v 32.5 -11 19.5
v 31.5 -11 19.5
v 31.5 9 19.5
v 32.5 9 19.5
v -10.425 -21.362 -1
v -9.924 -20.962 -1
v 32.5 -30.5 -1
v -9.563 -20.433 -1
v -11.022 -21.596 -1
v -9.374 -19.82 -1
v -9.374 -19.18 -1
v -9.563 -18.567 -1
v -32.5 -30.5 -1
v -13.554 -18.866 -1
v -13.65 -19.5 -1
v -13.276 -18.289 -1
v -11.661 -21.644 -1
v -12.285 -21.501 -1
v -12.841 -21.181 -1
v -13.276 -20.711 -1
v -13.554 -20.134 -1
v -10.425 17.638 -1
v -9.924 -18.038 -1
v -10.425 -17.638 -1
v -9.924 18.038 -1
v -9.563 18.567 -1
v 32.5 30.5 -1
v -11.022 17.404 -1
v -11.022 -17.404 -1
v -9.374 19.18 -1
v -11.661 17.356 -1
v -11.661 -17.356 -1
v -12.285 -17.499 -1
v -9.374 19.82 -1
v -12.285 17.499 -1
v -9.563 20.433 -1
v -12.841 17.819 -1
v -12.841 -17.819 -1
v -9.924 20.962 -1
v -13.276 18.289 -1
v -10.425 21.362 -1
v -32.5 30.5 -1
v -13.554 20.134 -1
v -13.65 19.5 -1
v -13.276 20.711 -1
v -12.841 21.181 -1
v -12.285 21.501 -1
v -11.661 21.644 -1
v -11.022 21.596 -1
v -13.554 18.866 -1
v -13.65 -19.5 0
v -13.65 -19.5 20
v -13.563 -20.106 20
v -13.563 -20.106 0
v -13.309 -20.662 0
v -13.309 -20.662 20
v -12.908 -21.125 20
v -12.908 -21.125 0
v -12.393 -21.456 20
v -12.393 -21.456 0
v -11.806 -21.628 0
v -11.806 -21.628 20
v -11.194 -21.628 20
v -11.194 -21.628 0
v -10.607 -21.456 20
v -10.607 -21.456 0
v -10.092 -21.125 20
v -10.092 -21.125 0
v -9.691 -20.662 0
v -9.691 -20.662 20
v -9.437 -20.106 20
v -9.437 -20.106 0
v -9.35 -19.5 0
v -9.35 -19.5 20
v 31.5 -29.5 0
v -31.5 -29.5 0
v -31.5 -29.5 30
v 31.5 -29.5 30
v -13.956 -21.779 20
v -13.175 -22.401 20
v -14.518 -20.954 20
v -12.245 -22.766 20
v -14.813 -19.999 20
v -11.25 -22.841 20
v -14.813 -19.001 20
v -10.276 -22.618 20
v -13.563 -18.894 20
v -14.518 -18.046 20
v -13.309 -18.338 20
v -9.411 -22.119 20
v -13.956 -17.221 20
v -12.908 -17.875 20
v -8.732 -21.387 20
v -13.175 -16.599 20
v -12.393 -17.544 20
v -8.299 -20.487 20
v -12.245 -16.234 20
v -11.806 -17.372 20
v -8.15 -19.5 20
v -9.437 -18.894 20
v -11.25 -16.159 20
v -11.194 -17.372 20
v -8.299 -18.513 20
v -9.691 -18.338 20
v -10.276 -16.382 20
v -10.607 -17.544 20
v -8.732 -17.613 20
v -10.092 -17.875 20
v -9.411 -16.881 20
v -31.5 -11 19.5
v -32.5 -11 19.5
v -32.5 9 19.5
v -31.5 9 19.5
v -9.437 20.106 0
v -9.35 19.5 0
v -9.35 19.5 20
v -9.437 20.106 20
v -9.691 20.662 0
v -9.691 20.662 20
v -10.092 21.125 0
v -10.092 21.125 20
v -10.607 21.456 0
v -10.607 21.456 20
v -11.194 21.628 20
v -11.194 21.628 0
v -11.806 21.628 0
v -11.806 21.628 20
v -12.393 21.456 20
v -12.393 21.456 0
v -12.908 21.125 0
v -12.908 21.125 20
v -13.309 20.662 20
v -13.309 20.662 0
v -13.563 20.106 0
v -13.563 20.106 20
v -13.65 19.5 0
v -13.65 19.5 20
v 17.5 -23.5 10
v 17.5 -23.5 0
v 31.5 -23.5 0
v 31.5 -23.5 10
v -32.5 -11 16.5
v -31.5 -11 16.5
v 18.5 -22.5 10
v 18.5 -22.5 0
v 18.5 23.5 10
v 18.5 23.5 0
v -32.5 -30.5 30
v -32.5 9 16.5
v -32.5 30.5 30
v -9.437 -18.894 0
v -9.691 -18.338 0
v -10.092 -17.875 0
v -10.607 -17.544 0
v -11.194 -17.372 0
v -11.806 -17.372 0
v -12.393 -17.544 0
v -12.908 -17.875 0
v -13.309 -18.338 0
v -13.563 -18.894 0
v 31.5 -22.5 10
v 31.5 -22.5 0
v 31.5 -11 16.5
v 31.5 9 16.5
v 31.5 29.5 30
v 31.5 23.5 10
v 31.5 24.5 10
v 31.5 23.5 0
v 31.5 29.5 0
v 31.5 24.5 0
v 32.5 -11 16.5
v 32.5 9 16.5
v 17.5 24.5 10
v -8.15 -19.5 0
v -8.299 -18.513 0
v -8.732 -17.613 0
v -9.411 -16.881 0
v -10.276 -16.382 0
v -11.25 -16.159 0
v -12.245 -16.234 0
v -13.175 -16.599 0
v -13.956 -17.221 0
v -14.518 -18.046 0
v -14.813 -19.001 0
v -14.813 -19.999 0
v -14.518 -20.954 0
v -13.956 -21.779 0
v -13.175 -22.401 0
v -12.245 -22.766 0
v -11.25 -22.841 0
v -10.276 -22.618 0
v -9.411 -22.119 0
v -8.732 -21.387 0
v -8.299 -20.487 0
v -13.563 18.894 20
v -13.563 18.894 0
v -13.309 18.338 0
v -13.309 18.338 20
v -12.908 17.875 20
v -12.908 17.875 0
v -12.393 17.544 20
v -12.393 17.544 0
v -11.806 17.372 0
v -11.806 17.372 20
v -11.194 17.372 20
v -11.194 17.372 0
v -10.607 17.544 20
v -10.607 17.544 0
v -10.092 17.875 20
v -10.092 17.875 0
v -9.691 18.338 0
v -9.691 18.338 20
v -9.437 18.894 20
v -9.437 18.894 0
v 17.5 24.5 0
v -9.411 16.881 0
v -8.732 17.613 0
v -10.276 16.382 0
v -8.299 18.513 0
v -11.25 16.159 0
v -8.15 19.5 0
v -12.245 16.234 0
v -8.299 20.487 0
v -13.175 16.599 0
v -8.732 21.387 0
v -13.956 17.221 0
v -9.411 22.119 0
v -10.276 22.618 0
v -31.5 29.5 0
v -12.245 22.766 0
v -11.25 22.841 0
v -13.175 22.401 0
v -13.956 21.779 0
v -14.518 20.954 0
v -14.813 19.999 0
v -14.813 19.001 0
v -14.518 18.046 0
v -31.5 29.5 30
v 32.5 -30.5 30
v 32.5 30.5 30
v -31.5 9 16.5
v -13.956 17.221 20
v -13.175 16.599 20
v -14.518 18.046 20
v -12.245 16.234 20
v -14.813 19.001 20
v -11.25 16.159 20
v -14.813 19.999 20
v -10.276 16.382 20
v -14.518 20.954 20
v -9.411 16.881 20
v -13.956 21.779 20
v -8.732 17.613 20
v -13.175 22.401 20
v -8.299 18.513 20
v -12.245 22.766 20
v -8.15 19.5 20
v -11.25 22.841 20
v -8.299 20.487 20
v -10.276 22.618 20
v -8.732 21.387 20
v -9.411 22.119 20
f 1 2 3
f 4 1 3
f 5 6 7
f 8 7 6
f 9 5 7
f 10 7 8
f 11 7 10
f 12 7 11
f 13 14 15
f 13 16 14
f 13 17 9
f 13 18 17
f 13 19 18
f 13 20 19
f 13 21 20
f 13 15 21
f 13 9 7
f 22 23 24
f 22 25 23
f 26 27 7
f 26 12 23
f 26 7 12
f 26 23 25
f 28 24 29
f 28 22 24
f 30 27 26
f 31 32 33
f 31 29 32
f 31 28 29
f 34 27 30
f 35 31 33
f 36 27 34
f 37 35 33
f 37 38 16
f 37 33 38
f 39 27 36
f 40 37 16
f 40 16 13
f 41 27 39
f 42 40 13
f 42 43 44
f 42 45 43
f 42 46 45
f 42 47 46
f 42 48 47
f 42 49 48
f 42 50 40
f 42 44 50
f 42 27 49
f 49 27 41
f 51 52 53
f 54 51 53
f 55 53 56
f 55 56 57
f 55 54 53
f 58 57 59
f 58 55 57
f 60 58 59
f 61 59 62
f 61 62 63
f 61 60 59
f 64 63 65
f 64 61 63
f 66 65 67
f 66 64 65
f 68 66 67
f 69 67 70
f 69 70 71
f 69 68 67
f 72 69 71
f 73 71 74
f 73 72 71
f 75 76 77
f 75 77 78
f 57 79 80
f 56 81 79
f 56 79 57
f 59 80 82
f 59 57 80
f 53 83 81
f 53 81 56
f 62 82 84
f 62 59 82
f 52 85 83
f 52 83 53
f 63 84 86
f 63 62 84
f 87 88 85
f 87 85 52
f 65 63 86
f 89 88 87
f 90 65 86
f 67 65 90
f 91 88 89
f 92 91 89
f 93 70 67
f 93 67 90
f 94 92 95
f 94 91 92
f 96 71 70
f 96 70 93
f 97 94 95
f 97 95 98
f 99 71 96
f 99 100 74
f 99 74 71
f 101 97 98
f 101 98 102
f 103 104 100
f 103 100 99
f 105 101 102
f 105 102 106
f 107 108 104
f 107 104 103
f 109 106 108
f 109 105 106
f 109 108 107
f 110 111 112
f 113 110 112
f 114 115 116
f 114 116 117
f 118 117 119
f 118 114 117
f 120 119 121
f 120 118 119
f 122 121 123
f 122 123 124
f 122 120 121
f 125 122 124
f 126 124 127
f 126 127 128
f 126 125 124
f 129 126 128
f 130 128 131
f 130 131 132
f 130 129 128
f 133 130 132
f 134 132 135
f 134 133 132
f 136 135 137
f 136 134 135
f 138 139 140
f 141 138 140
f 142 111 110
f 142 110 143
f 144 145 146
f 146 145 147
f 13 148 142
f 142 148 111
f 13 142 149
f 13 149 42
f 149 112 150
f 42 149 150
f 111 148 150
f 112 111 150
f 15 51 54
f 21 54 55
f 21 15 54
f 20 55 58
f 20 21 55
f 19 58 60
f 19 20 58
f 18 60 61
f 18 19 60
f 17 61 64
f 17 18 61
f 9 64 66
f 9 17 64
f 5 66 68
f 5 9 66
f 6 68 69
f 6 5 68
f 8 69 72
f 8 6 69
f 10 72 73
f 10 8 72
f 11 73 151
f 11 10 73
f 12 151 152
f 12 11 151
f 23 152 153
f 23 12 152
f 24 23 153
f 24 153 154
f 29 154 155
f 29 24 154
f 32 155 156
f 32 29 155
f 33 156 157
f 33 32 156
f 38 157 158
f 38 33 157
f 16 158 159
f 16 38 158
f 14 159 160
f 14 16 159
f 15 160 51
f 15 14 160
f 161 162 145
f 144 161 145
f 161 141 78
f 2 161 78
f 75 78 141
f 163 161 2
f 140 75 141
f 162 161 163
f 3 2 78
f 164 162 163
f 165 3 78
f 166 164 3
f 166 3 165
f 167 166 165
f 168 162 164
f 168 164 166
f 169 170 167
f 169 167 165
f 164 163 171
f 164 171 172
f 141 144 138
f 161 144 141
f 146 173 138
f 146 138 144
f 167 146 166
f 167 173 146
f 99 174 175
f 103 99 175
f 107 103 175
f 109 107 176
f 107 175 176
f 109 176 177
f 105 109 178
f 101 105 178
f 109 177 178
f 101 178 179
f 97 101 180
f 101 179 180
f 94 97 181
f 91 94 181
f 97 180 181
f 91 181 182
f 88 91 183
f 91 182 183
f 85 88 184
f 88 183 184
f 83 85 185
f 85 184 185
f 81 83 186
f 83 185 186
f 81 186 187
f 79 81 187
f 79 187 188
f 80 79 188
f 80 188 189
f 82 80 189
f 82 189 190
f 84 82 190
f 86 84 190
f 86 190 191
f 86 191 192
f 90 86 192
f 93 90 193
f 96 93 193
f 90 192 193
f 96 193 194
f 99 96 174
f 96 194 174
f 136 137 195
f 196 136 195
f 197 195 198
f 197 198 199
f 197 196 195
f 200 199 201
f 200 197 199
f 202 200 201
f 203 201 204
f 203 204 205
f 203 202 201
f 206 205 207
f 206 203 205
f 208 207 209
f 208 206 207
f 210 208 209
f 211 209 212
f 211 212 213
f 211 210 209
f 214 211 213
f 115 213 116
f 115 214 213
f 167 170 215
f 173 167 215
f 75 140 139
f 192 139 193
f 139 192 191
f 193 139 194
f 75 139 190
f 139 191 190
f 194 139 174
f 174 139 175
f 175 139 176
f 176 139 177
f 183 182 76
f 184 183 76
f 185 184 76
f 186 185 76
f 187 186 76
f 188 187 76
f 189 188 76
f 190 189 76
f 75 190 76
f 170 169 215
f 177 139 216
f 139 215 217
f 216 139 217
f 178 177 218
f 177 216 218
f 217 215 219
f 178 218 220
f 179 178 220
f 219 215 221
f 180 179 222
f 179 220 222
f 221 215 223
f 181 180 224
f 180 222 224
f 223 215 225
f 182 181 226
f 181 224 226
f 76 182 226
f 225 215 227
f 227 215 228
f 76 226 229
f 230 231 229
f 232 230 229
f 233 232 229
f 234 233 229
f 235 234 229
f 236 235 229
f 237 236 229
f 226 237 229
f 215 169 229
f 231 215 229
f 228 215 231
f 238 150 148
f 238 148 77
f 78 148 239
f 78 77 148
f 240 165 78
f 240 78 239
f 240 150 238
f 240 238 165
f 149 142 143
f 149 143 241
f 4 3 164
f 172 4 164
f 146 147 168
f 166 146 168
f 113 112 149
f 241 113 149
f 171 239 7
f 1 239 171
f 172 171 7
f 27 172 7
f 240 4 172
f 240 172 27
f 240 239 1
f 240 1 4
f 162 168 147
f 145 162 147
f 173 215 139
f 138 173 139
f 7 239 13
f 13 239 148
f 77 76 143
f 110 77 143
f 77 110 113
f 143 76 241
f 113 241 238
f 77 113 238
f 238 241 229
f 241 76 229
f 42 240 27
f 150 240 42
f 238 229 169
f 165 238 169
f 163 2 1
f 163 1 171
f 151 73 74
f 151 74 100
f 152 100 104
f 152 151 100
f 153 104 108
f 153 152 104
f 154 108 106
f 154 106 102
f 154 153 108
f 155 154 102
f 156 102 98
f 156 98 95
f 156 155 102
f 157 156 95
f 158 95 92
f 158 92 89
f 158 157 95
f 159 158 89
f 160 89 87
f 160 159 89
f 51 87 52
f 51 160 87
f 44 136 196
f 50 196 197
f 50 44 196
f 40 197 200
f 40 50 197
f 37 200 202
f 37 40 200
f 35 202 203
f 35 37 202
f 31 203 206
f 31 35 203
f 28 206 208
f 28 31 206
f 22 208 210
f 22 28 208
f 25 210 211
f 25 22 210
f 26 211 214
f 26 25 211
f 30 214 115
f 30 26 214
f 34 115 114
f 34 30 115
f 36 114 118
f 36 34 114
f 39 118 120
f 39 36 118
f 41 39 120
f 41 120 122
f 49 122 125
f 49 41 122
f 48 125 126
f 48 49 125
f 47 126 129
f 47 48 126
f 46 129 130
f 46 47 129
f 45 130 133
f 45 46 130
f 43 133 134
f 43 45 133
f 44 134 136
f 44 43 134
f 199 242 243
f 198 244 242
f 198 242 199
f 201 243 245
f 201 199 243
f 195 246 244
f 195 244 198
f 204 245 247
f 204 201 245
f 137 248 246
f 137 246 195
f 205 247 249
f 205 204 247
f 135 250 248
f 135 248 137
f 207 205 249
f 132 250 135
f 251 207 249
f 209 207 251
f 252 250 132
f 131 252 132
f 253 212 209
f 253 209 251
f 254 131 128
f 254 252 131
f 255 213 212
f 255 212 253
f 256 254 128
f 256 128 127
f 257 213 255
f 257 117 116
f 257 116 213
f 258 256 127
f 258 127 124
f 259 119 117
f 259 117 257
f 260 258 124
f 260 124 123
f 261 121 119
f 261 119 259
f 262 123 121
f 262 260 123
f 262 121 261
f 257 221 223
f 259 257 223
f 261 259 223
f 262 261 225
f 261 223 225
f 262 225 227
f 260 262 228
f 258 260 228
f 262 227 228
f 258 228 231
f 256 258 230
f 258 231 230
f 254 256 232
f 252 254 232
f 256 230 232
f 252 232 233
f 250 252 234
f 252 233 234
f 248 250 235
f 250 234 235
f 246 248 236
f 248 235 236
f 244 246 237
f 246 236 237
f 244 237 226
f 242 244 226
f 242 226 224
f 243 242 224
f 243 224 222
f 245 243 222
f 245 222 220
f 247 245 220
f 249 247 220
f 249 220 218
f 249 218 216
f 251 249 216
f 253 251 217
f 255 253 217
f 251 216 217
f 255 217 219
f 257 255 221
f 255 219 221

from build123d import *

# Parameters (mm, degrees)
CROQUIS1_W                 = 65
CROQUIS1_H                 = 61
SALIENTE_EXTRUIR1_DEPTH    = 30
CROQUIS1_7_R               = 3.35
CROQUIS1_7_R_2             = 2.15
SALIENTE_EXTRUIR2_DEPTH    = 20
SALIENTE_EXTRUIR2_2_DEPTH  = 20
SALIENTE_EXTRUIR4_DEPTH    = 10
CROQUIS2_W                 = 65
CROQUIS2_H                 = 61
SALIENTE_EXTRUIR5_DEPTH    = 1
CORTAR_EXTRUIR1_DEPTH      = 54.726157503
CORTAR_EXTRUIR1_DEPTH_BACK = 54.726157503
CROQUIS3_W                 = 3
CROQUIS3_H                 = 20
CORTAR_EXTRUIR2_START      = -40
CROQUIS5_R                 = 2.15
CORTAR_EXTRUIR2_DEPTH      = 40


with BuildPart() as part:
    # Croquis1 → Saliente-Extruir1 (new body)
    with BuildSketch(Plane.XY):
        Rectangle(CROQUIS1_W, CROQUIS1_H)
        Polygon((31.5, -29.5), (-31.5, -29.5), (-31.5, 29.5), (31.5, 29.5), (31.5, 24.5), (31.5, 23.5), (31.5, -22.5), (31.5, -23.5), align=None, mode=Mode.SUBTRACT)
    extrude(amount=SALIENTE_EXTRUIR1_DEPTH)

    # Croquis1<9> → Saliente-Extruir4 (add)
    with BuildSketch(Plane.XY):
        Polygon((17.5, -23.5), (31.5, -23.5), (31.5, -22.5), (18.5, -22.5), (18.5, 23.5), (31.5, 23.5), (31.5, 24.5), (17.5, 24.5), align=None)
    extrude(amount=SALIENTE_EXTRUIR4_DEPTH)



with BuildPart() as body_2:
    # Croquis1<7> → Saliente-Extruir2 (new body)
    with BuildSketch(Plane.XY):
        with Locations((-11.5, -19.5)):
            Circle(CROQUIS1_7_R)
        with Locations((-11.5, -19.5)):
            Circle(CROQUIS1_7_R_2, mode=Mode.SUBTRACT)
    extrude(amount=SALIENTE_EXTRUIR2_DEPTH)


with BuildPart() as body_3:
    # Croquis1<7> → Saliente-Extruir2 2 (new body)
    with BuildSketch(Plane.XY):
        with Locations((-11.5, 19.5)):
            Circle(CROQUIS1_7_R)
        with Locations((-11.5, 19.5)):
            Circle(CROQUIS1_7_R_2, mode=Mode.SUBTRACT)
    extrude(amount=SALIENTE_EXTRUIR2_2_DEPTH)


with BuildPart() as part_1:
    add(part.part)

    add(body_2.part)  # Saliente-Extruir5 merges body 2

    add(body_3.part)  # Saliente-Extruir5 merges body 3
    # Croquis2 → Saliente-Extruir5 (add)
    with BuildSketch(Plane(origin=(0, 0, 0), x_dir=(-1, 0, 0), z_dir=(0, 0, -1))):
        Rectangle(CROQUIS2_W, CROQUIS2_H)
    extrude(amount=SALIENTE_EXTRUIR5_DEPTH)

    # Croquis3 → Cortar-Extruir1 (cut, two sides: drawn at the far end of the back side and taken through both)
    with BuildSketch(Plane(origin=(0, 0, 0), x_dir=(0, 0, -1), z_dir=(1, 0, 0)).offset(-CORTAR_EXTRUIR1_DEPTH_BACK)):
        with Locations((-18, -1)):
            Rectangle(CROQUIS3_W, CROQUIS3_H)
    extrude(amount=CORTAR_EXTRUIR1_DEPTH + CORTAR_EXTRUIR1_DEPTH_BACK, mode=Mode.SUBTRACT)

    # Croquis5 → Cortar-Extruir2 (cut)
    with BuildSketch(Plane.XY.offset(20).offset(CORTAR_EXTRUIR2_START)):
        with Locations((-11.5, -19.5)):
            Circle(CROQUIS5_R)
        with Locations((-11.5, 19.5)):
            Circle(CROQUIS5_R)
    extrude(amount=CORTAR_EXTRUIR2_DEPTH, mode=Mode.SUBTRACT)


solid = part_1.part
